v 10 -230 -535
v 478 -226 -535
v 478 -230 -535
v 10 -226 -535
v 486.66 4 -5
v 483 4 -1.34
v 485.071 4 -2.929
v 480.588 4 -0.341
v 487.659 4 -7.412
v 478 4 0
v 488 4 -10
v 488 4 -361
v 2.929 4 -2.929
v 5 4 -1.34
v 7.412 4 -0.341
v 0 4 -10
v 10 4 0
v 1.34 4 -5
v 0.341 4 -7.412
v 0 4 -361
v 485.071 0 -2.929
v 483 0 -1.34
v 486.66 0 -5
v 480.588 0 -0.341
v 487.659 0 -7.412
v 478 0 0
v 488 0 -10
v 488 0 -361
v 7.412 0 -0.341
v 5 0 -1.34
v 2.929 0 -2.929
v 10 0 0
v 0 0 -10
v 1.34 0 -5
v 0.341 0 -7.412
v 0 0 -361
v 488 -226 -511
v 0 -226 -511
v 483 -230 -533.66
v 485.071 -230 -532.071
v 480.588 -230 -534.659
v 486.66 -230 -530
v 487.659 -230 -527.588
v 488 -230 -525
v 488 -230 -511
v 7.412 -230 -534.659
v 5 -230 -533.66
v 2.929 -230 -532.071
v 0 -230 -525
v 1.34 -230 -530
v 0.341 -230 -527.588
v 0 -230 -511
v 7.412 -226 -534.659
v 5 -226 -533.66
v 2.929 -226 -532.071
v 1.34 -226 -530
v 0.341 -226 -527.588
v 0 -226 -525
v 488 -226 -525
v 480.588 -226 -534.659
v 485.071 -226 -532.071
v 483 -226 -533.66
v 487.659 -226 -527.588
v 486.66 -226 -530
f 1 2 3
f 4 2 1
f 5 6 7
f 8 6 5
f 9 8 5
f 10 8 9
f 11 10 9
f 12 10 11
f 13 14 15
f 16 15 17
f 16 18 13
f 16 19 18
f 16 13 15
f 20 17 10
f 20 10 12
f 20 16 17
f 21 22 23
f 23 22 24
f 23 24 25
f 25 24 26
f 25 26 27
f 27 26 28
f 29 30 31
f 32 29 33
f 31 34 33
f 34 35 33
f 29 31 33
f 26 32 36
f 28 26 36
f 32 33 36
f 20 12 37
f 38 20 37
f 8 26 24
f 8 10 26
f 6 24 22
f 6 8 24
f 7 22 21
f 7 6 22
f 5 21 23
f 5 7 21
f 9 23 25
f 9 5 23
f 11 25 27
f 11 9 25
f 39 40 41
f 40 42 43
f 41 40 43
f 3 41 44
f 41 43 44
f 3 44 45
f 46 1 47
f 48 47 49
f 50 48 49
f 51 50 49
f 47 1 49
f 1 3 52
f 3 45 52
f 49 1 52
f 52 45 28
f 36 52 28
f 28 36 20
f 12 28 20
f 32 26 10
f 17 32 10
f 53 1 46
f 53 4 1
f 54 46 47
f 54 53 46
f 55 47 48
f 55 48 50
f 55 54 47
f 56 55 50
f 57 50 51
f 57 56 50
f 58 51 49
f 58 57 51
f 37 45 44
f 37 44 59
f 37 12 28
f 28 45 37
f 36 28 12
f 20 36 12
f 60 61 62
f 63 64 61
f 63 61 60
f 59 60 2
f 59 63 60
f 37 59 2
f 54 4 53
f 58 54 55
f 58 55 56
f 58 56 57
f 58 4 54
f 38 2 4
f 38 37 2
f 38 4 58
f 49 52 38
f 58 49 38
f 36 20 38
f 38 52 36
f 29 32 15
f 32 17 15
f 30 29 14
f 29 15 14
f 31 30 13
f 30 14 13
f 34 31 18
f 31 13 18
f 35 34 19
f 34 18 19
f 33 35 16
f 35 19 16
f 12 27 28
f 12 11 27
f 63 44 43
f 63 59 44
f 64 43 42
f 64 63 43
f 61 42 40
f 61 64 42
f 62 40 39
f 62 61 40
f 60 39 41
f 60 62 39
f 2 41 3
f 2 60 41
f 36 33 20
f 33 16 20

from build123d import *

# Parameters (mm, degrees)
SKETCH2_W           = 361
SKETCH2_H           = 4
BOSS_EXTRUDE1_DEPTH = 488
BOSS_EXTRUDE2_DEPTH = 488
SKETCH4_W           = 488
SKETCH4_H           = 4
BOSS_EXTRUDE3_DEPTH = 24
FILLET2_R           = 10
FILLET3_R           = 10


with BuildPart() as part:
    # Sketch2 → Boss-Extrude1 (new body)
    with BuildSketch(Plane(origin=(0, 0, 0), x_dir=(0, 0, -1), z_dir=(1, 0, 0))):
        with Locations((180.5, 2)):
            Rectangle(SKETCH2_W, SKETCH2_H)
    extrude(amount=BOSS_EXTRUDE1_DEPTH)

    # Fillet3
    fillet3_edges = [part.edges().sort_by_distance(p)[0] for p in [
        (488, 2, 0),
        (0, 2, 0),
    ]]
    fillet(fillet3_edges, radius=FILLET3_R)


with BuildPart() as body_2:
    # Sketch3 → Boss-Extrude2 (new body)
    with BuildSketch(Plane(origin=(488, 0, 0), x_dir=(0, 0, -1), z_dir=(1, 0, 0))):
        Polygon((361, 4), (511, -226), (511, -230), (361, 0), align=None)
    extrude(amount=-BOSS_EXTRUDE2_DEPTH)

    # Sketch4 → Boss-Extrude3 (add)
    with BuildSketch(Plane(origin=(0, 0, -511), x_dir=(-1, 0, 0), z_dir=(0, 0, -1))):
        with Locations((-244, -228)):
            Rectangle(SKETCH4_W, SKETCH4_H)
    extrude(amount=BOSS_EXTRUDE3_DEPTH)

    # Fillet2
    fillet2_edges = [body_2.edges().sort_by_distance(p)[0] for p in [
        (0, -228, -535),
        (488, -228, -535),
    ]]
    fillet(fillet2_edges, radius=FILLET2_R)


solid = Compound([part.part, body_2.part])
